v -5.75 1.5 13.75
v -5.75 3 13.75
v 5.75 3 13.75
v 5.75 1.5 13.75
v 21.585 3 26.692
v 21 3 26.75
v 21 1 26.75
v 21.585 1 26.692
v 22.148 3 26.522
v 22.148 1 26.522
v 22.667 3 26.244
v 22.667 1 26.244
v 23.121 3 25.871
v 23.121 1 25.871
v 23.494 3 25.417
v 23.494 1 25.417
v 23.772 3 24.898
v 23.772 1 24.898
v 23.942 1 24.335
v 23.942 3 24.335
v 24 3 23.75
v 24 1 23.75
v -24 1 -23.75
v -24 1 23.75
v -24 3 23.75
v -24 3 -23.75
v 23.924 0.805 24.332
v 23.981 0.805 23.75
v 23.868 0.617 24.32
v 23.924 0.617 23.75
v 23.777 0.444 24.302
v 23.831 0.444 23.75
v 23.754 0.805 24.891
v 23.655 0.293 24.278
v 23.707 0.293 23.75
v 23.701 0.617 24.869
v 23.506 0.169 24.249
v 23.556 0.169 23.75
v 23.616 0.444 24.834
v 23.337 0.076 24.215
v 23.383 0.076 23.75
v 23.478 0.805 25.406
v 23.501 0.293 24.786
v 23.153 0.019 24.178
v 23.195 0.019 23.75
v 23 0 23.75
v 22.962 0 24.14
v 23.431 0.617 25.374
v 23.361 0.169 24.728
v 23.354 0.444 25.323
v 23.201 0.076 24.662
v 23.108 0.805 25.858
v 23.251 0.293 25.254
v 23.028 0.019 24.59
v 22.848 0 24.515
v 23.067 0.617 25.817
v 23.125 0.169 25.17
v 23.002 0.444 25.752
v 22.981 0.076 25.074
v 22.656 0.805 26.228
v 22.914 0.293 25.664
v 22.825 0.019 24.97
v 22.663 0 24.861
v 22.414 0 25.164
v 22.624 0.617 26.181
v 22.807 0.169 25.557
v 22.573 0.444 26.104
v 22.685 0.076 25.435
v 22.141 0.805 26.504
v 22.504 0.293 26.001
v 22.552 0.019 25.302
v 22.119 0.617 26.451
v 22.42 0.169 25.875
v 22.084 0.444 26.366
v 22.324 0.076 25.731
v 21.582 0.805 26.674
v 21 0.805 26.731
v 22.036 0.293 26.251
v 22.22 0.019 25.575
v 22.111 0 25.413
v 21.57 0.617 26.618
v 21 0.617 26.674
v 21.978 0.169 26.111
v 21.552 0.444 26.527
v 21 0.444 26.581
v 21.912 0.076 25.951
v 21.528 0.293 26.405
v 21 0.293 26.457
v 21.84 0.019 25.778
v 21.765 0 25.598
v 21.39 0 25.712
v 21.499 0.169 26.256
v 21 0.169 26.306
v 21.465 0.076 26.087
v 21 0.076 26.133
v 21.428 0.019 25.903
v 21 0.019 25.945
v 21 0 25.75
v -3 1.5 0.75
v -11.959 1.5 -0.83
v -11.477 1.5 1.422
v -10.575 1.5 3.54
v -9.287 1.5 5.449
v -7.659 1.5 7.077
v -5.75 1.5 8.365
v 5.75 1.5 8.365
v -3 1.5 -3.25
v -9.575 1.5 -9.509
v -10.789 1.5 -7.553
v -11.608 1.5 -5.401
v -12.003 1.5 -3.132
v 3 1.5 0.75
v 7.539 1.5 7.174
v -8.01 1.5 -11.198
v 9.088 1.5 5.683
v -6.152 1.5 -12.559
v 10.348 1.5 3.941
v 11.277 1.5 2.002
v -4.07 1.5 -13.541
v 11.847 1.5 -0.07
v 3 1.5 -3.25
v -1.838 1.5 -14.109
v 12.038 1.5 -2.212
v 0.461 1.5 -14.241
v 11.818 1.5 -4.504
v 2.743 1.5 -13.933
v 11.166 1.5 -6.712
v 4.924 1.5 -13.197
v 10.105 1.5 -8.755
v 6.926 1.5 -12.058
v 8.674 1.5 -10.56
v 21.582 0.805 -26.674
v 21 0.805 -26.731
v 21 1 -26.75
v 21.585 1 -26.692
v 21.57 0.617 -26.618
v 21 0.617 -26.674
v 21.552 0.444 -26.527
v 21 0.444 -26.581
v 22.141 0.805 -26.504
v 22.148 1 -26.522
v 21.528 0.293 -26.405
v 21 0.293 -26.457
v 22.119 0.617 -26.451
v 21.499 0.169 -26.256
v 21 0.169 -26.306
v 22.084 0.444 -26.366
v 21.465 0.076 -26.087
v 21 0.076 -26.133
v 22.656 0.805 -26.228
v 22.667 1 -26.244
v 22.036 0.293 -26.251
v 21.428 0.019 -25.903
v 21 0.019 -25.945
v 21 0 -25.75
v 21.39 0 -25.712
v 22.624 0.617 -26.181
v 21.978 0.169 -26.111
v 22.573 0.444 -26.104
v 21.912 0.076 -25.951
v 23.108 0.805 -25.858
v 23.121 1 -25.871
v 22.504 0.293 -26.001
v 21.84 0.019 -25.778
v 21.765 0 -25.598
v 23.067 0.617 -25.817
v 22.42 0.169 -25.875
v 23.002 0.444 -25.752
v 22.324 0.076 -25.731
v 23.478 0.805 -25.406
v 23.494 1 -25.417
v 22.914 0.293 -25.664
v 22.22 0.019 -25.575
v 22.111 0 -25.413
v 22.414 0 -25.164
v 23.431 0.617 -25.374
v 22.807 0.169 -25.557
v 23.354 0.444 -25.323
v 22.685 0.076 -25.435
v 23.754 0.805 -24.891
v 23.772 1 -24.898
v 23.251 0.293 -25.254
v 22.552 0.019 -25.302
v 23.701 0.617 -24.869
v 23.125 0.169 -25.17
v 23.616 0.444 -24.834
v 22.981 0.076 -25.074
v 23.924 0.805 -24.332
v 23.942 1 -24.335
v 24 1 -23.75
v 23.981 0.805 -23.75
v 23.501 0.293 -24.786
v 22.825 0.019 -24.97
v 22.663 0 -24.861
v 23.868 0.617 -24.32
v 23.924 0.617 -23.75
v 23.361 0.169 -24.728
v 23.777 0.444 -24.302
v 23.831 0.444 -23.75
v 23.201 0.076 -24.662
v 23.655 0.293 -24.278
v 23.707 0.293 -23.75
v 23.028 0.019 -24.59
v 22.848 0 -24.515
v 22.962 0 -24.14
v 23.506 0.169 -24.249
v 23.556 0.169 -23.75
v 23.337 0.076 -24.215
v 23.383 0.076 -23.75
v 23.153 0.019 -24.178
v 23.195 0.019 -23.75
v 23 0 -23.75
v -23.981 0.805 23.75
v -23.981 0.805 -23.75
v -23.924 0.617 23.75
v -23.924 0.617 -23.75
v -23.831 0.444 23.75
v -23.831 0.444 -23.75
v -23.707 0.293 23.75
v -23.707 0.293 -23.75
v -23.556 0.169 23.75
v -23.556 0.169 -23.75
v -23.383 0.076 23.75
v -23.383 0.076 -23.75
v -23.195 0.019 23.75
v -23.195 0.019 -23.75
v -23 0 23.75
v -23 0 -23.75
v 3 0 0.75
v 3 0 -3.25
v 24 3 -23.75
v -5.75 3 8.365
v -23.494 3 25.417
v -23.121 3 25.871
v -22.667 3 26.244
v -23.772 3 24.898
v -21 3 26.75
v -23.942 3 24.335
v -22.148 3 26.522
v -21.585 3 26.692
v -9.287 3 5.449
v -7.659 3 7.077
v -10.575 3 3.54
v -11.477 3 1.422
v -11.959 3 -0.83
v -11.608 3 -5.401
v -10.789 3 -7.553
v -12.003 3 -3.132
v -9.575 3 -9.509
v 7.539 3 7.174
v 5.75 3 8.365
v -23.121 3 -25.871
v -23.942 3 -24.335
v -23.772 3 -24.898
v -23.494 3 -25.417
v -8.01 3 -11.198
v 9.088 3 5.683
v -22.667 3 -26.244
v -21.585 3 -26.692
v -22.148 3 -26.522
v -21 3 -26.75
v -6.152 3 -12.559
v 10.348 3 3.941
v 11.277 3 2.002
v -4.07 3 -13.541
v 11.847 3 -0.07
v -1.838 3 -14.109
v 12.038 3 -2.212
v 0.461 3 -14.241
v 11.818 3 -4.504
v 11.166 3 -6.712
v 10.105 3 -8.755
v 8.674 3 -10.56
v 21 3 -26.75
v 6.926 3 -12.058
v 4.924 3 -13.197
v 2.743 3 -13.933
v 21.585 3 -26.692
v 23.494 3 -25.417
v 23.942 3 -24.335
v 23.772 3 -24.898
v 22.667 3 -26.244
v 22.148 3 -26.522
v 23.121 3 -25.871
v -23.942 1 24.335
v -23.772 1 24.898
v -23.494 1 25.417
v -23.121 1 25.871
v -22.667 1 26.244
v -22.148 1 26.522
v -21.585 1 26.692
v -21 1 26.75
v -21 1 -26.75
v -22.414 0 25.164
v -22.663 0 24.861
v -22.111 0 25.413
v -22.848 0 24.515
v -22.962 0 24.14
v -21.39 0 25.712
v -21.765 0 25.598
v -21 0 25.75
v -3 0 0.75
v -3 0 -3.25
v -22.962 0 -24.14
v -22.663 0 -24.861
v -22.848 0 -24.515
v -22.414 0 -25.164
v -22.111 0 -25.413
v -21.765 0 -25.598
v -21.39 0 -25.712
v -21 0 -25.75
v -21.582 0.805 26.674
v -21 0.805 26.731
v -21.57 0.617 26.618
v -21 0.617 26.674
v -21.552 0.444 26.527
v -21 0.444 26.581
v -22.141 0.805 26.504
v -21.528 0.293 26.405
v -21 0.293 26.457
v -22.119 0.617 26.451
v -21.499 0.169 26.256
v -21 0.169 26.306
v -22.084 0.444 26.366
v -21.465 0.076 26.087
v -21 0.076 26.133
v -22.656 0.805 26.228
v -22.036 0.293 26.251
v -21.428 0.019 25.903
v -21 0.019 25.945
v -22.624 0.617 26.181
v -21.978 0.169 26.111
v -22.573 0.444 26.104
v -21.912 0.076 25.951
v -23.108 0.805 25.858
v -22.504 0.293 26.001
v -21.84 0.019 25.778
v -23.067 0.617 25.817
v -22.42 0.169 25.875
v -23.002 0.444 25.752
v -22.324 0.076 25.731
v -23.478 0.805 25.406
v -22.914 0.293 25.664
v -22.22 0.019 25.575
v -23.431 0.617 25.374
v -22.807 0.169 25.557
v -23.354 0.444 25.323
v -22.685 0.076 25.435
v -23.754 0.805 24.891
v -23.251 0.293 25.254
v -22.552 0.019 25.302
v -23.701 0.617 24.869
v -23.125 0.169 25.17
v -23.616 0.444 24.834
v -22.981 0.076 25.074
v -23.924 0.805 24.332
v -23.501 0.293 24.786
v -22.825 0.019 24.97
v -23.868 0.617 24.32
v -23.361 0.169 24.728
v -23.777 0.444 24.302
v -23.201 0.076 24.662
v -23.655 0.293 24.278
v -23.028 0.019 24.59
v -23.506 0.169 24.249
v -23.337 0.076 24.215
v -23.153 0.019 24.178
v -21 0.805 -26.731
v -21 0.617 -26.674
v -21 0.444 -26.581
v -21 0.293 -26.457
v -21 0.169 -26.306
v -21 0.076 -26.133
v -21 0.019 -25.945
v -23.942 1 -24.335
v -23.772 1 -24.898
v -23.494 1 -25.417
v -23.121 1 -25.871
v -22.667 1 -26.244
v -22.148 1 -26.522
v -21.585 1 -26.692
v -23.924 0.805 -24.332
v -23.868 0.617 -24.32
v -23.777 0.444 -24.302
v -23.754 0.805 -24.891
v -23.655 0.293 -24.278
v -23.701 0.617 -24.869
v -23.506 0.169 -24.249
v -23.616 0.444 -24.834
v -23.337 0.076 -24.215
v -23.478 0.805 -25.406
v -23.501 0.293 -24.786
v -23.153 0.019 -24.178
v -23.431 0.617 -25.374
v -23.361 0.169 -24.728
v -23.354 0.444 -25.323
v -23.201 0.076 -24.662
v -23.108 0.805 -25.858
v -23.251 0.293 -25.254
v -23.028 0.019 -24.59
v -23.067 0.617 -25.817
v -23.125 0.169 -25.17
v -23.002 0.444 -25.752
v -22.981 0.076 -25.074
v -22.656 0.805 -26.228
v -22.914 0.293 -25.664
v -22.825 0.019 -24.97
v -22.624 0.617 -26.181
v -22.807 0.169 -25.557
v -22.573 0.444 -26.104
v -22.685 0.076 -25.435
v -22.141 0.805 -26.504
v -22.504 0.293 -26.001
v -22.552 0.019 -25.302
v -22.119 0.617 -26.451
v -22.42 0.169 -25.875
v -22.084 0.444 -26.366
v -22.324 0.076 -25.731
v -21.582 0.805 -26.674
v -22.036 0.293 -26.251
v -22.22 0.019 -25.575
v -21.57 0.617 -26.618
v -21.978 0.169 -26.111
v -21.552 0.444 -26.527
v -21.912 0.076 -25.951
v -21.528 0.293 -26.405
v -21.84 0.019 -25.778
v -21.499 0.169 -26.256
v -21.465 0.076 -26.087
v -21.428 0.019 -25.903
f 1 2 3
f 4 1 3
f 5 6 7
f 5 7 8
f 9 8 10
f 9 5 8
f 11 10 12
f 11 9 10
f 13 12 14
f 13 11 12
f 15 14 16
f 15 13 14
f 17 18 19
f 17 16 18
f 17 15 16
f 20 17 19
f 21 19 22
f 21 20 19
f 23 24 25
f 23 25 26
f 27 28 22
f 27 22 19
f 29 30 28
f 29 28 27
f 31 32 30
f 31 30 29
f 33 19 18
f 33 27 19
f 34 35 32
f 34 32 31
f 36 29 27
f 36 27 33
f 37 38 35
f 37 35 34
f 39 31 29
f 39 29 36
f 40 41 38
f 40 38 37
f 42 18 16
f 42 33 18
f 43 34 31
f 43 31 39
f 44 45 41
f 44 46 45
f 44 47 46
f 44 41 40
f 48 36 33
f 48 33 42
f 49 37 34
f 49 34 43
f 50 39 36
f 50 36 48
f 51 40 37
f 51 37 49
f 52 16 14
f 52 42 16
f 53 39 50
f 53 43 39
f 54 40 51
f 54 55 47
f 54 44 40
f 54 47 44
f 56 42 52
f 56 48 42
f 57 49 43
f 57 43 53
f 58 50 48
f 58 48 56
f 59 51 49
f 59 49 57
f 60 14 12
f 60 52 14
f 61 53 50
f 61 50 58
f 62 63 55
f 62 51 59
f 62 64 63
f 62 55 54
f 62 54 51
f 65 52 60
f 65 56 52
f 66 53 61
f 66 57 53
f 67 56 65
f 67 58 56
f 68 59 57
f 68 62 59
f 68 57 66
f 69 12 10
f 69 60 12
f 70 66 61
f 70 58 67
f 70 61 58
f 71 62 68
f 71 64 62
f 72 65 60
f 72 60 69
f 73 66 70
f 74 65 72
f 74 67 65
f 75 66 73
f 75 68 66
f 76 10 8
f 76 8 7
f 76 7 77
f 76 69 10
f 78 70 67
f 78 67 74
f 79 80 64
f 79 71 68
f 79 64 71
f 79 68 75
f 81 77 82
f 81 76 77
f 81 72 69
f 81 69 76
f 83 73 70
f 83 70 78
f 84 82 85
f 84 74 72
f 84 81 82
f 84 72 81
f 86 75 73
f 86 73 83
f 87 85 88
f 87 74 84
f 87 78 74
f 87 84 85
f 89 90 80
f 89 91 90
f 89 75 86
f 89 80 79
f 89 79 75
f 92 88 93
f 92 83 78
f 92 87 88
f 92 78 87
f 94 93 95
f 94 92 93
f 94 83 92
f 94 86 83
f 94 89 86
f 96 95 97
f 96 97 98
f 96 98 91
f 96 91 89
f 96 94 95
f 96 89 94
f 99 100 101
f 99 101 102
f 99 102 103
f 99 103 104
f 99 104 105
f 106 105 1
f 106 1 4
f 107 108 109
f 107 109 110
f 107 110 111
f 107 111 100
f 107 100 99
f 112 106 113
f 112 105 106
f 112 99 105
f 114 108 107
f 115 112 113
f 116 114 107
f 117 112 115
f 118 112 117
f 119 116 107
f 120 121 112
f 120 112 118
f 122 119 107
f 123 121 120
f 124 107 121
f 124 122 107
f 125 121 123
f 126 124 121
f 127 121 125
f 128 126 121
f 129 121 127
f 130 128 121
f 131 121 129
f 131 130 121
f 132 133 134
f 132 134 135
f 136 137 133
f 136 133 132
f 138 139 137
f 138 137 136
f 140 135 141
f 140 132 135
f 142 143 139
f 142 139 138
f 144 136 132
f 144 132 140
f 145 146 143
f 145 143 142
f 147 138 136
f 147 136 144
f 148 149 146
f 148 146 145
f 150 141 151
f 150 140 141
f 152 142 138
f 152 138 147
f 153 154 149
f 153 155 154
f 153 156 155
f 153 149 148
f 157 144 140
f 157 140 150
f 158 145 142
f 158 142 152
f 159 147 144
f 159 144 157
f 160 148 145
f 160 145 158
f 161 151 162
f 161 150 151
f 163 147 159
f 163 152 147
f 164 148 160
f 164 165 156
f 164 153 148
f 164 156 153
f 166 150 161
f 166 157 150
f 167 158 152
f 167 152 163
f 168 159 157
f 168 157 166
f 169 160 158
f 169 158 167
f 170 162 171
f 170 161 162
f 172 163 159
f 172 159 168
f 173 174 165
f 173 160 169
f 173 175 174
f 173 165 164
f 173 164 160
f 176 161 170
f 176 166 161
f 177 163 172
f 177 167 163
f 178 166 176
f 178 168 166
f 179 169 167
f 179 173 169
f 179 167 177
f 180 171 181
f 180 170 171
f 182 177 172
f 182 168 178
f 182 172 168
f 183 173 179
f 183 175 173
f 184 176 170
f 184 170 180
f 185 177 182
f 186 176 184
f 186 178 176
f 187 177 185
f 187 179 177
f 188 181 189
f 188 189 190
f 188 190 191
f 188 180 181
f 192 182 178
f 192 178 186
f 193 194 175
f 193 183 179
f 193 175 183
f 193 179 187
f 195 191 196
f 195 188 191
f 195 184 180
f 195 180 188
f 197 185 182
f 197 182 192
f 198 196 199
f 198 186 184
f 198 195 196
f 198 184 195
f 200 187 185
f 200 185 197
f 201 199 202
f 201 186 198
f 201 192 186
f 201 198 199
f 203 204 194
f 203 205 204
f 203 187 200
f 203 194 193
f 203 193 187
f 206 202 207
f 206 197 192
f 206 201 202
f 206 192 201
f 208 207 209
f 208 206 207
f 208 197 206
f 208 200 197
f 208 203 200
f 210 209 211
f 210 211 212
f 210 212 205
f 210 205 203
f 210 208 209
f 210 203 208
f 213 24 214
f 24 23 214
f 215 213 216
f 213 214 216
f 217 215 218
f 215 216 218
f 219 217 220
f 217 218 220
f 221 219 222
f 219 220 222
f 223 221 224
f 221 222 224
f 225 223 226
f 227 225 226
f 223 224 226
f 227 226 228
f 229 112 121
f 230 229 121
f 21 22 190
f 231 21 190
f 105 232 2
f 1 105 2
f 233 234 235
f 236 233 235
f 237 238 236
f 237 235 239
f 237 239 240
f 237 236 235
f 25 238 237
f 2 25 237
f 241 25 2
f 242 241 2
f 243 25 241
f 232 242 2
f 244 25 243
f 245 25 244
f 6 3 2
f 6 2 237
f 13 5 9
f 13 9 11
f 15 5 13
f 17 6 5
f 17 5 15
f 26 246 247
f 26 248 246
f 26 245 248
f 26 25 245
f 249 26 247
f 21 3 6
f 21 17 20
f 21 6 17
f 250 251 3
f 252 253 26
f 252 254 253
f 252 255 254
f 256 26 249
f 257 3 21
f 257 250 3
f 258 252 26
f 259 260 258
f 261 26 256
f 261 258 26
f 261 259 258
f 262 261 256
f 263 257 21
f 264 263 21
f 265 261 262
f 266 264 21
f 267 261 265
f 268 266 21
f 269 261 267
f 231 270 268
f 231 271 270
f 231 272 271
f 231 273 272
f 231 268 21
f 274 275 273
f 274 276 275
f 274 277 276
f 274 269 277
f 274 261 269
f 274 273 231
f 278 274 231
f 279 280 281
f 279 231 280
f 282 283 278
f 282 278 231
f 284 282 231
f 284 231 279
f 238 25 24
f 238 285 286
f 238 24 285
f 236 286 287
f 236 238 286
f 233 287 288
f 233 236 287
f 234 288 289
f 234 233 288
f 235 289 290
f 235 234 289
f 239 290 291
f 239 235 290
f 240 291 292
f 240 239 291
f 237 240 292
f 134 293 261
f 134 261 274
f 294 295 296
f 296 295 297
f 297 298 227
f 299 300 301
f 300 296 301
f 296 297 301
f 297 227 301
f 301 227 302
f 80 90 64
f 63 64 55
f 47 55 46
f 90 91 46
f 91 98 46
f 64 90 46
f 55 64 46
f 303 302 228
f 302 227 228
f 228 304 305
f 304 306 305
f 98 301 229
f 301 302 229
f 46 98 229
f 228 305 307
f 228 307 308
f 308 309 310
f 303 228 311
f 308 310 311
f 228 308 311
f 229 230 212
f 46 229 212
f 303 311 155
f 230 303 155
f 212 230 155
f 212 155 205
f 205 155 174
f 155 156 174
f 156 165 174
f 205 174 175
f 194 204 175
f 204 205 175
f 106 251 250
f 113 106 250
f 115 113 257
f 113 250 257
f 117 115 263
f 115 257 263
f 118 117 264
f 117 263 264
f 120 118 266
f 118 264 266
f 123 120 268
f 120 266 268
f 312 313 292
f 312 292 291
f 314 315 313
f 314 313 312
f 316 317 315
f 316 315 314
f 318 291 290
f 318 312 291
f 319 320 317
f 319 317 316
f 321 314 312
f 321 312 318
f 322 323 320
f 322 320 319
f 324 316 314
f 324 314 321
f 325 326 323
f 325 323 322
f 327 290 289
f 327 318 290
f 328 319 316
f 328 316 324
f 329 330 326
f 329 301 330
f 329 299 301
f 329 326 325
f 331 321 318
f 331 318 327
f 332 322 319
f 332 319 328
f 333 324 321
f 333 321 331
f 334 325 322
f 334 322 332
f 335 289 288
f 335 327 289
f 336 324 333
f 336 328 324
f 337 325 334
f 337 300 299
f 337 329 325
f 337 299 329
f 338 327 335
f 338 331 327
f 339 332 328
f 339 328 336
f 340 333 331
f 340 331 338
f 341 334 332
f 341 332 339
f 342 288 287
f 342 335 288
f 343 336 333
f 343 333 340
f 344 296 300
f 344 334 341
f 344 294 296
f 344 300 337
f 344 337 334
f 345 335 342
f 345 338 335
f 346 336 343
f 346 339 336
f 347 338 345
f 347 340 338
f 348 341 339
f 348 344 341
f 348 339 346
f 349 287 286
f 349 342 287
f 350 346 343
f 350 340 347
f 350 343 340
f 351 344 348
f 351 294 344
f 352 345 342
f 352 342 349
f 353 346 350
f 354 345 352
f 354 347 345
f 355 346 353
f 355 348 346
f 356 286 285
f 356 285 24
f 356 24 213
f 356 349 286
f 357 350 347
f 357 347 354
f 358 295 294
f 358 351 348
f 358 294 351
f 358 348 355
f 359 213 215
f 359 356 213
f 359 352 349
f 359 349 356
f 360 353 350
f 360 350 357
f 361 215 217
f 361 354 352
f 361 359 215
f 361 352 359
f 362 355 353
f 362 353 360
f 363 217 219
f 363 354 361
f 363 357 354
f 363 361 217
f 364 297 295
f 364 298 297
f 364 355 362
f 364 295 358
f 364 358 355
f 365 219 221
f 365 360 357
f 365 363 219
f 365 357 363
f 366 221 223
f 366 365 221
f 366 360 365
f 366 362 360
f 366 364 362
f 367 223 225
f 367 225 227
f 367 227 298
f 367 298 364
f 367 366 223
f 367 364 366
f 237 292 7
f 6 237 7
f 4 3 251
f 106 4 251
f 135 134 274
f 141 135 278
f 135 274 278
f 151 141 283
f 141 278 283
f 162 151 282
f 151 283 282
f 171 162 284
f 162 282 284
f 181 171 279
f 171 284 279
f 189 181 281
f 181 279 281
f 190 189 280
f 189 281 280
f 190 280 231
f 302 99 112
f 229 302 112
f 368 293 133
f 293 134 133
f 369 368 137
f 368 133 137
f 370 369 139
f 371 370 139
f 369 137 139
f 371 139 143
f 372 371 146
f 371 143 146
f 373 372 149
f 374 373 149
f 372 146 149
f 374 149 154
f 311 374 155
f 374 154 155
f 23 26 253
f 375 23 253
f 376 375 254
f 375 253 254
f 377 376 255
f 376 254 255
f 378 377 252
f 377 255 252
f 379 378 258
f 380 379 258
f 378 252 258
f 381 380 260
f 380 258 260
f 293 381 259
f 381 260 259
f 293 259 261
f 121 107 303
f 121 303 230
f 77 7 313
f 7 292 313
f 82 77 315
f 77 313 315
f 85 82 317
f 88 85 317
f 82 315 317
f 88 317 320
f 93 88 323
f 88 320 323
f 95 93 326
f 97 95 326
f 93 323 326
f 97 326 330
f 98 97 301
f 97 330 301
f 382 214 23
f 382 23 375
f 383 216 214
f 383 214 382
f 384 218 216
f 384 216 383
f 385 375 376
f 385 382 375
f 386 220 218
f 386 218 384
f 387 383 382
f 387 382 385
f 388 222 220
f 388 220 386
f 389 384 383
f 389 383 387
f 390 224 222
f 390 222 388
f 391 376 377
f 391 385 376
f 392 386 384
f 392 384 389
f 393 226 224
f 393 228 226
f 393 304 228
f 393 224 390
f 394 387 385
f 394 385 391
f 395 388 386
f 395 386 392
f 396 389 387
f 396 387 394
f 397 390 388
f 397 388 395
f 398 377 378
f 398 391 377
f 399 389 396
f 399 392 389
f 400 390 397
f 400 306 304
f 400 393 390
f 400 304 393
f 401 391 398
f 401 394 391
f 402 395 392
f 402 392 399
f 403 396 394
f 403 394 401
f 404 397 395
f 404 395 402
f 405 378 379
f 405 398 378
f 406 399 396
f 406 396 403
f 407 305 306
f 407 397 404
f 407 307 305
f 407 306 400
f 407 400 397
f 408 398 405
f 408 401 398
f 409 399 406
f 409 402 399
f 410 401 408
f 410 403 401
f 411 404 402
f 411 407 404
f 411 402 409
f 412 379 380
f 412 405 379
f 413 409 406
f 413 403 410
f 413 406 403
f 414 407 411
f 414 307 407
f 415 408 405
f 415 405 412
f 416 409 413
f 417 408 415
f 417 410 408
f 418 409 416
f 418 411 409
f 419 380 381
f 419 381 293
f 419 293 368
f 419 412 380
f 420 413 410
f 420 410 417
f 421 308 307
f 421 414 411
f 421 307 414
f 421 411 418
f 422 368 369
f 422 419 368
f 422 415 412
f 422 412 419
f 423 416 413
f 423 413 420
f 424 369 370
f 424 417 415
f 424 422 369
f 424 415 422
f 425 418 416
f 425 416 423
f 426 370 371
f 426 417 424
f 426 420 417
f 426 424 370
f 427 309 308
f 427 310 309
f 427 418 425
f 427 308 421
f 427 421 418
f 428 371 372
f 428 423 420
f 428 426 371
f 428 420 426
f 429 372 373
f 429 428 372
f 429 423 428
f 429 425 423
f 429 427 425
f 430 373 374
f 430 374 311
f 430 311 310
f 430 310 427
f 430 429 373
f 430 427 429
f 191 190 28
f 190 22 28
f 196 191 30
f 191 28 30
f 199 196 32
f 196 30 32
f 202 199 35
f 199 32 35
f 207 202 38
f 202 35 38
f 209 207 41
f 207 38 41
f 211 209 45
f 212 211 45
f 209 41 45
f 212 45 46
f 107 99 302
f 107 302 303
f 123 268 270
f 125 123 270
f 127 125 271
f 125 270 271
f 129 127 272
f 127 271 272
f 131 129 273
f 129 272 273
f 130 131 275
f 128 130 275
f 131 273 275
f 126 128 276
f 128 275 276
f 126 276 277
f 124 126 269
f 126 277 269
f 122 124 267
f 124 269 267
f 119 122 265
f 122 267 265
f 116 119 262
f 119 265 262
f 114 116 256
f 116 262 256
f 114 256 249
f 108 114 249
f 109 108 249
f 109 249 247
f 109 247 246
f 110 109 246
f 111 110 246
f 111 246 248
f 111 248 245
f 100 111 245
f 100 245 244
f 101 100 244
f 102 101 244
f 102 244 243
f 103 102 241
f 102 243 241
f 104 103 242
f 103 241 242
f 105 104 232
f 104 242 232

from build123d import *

# Parameters (mm, degrees)
SKETCH1_W           = 42
SKETCH1_H           = 47.5
BOSS_EXTRUDE1_DEPTH = 3
CUT_EXTRUDE2_DEPTH  = 1.5
SKETCH3_W           = 6
SKETCH3_H           = 4
CUT_EXTRUDE3_DEPTH  = 5
SKETCH4_W           = 48
SKETCH4_H           = 53.5
SKETCH4_W_2         = 42
SKETCH4_H_2         = 47.5
BOSS_EXTRUDE2_DEPTH = 3
FILLET1_R           = 3
FILLET2_R           = 1


with BuildPart() as part:
    # Sketch1 → Boss-Extrude1 (new body)
    with BuildSketch(Plane(origin=(0, 0, 0), x_dir=(1, 0, 0), z_dir=(0, 1, 0))):
        Rectangle(SKETCH1_W, SKETCH1_H)
    extrude(amount=BOSS_EXTRUDE1_DEPTH)

    # Sketch2 → Cut-Extrude2 (cut)
    with BuildSketch(Plane(origin=(0, 3, 0), x_dir=(1, 0, 0), z_dir=(0, 1, 0))):
        with BuildLine():
            ThreePointArc((12.038461538, 2.211538462), (-6.152373622, 12.559139876), (-5.75, -8.364947543))
            Line((-5.75, -8.364947543), (-5.75, -7.75))
            Line((-5.75, -7.75), (5.75, -7.75))
            Line((5.75, -7.75), (5.75, -8.364947543))
            ThreePointArc((5.75, -8.364947543), (10.347601414, -3.94083516), (12.038461538, 2.211538462))
        make_face()
        with BuildLine():
            Line((-5.75, -7.75), (-5.75, -8.364947543))
            ThreePointArc((-5.75, -8.364947543), (0, -9.826923077), (5.75, -8.364947543))
            Line((5.75, -8.364947543), (5.75, -7.75))
            Line((5.75, -7.75), (-5.75, -7.75))
        make_face()
        with BuildLine():
            Line((-5.75, -8.364947543), (-5.75, -13.75))
            Line((-5.75, -13.75), (5.75, -13.75))
            Line((5.75, -13.75), (5.75, -8.364947543))
            ThreePointArc((5.75, -8.364947543), (0, -9.826923077), (-5.75, -8.364947543))
        make_face()
    extrude(amount=-CUT_EXTRUDE2_DEPTH, mode=Mode.SUBTRACT)

    # Sketch3 → Cut-Extrude3 (cut)
    with BuildSketch(Plane(origin=(0, 3, 0), x_dir=(1, 0, 0), z_dir=(0, 1, 0))):
        with Locations((0, 1.25)):
            Rectangle(SKETCH3_W, SKETCH3_H)
    extrude(amount=-CUT_EXTRUDE3_DEPTH, mode=Mode.SUBTRACT)

    # Sketch4 → Boss-Extrude2 (add)
    with BuildSketch(Plane(origin=(0, 0, 0), x_dir=(1, 0, 0), z_dir=(0, 1, 0))):
        Rectangle(SKETCH4_W, SKETCH4_H)
        Rectangle(SKETCH4_W_2, SKETCH4_H_2, mode=Mode.SUBTRACT)
    extrude(amount=BOSS_EXTRUDE2_DEPTH)

    # Fillet1
    fillet1_edges = [part.edges().sort_by_distance(p)[0] for p in [
        (-24, 1.5, -26.75),
        (-24, 1.5, 26.75),
        (24, 1.5, 26.75),
        (24, 1.5, -26.75),
    ]]
    fillet(fillet1_edges, radius=FILLET1_R)

    # Fillet2
    fillet2_edges = [part.edges().sort_by_distance(p)[0] for p in [
        (-24, 0, 0),
        (0, 0, -26.75),
        (24, 0, 0),
        (0, 0, 26.75),
        (-23.121320344, 0, 25.871320344),
        (23.121320344, 0, 25.871320344),
        (23.121320344, 0, -25.871320344),
        (-23.121320344, 0, -25.871320344),
    ]]
    fillet(fillet2_edges, radius=FILLET2_R)


solid = part.part
